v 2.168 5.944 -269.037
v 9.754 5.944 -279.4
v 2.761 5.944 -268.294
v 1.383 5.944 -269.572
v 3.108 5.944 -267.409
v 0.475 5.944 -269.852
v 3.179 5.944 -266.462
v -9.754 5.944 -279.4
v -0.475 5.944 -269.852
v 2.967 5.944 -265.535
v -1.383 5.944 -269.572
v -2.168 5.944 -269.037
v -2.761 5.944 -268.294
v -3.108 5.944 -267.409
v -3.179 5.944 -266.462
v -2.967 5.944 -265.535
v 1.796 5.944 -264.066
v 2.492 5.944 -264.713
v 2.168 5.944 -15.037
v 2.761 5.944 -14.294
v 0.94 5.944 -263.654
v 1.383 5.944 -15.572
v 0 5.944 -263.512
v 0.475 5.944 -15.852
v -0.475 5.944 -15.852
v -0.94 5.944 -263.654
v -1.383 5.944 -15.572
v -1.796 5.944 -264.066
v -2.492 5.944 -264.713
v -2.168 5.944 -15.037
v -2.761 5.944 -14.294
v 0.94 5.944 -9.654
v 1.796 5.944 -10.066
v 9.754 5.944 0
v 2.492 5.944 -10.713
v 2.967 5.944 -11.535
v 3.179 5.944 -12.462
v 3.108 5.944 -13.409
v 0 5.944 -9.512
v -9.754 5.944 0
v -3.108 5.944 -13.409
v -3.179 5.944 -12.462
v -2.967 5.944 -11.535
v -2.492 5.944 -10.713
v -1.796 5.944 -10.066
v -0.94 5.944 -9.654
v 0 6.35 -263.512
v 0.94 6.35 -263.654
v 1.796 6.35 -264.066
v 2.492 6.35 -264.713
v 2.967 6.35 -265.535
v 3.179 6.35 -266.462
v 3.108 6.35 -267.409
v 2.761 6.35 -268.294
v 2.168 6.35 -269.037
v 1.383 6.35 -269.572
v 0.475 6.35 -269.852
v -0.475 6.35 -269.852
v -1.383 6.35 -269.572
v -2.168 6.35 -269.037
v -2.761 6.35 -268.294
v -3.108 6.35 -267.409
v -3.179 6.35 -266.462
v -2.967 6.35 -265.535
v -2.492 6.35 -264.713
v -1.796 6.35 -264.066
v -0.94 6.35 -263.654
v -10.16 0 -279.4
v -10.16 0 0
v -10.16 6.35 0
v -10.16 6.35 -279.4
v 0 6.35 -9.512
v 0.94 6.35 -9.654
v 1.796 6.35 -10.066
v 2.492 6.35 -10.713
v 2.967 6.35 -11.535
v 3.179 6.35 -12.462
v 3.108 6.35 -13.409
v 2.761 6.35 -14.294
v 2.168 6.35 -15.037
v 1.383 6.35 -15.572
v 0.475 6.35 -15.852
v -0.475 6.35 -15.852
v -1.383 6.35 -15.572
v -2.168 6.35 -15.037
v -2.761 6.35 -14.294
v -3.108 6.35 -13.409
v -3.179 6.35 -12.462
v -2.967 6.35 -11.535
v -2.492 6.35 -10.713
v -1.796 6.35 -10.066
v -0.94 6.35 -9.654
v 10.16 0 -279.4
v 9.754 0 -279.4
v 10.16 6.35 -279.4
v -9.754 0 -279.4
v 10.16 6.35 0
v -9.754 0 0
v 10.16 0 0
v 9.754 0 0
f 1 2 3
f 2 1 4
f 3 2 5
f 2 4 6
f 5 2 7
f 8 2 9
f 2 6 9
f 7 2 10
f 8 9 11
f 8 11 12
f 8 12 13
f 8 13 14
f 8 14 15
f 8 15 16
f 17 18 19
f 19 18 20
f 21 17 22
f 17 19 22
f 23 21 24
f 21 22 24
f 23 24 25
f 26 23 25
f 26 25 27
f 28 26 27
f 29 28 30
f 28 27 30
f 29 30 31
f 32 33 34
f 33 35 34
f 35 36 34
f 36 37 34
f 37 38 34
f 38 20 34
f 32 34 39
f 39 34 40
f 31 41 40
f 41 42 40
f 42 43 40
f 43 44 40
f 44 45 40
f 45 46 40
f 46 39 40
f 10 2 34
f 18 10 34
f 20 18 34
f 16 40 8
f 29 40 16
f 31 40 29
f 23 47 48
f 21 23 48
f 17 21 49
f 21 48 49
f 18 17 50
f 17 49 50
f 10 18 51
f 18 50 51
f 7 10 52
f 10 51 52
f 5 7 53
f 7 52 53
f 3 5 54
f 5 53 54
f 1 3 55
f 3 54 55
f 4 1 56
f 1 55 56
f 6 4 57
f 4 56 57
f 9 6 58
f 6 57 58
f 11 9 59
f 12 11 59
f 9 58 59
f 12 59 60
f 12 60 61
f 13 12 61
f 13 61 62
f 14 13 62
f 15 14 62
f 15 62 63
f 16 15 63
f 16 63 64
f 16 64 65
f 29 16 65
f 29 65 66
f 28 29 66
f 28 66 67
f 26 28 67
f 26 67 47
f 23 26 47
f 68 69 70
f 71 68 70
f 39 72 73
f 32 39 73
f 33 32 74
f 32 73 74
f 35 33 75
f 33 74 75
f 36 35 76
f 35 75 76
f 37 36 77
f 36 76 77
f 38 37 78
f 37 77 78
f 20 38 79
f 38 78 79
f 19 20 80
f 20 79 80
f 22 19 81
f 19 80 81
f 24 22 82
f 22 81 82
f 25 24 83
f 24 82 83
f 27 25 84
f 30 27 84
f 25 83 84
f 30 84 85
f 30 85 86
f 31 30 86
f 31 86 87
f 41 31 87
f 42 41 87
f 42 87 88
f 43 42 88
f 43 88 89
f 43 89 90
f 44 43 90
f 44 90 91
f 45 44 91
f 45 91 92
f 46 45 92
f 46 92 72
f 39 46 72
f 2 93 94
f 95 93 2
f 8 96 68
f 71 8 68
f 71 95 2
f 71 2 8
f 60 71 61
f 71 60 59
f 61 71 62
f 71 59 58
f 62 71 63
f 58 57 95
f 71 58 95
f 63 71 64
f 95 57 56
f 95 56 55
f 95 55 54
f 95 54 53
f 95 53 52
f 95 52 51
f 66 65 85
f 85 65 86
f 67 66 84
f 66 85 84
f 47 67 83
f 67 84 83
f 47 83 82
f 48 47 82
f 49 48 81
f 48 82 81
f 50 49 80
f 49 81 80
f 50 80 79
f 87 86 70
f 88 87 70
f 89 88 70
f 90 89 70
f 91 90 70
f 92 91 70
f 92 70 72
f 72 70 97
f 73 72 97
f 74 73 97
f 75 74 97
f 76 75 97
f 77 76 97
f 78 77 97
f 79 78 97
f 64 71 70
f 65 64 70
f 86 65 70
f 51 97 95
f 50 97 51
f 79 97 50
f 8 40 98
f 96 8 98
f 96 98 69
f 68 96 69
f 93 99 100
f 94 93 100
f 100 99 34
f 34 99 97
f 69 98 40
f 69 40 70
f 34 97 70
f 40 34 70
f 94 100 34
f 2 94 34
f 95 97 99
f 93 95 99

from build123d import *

# Parameters (mm, degrees)
BOSS_EXTRUDE1_DEPTH = 279.4
SKETCH2_R           = 3.1877
CUT_EXTRUDE1_DEPTH  = 280.656768379


with BuildPart() as part:
    # Sketch1 → Boss-Extrude1 (new body)
    with BuildSketch(Plane.XY):
        Polygon((-10.16, 0), (-10.16, 6.35), (10.16, 6.35), (10.16, 0), (9.7536, 0), (9.7536, 5.9436), (-9.7536, 5.9436), (-9.7536, 0), align=None)
    extrude(amount=-BOSS_EXTRUDE1_DEPTH)

    # Sketch2 → Cut-Extrude1 (cut, through all)
    with BuildSketch(Plane(origin=(0, 6.35, 0), x_dir=(1, 0, 0), z_dir=(0, 1, 0))):
        with Locations(Location((0, 266.7, 0), (0, 0, 270))):
            Circle(SKETCH2_R)
        with Locations(Location((0, 12.7, 0), (0, 0, 270))):
            Circle(SKETCH2_R)
    extrude(amount=-CUT_EXTRUDE1_DEPTH, mode=Mode.SUBTRACT)


solid = part.part
